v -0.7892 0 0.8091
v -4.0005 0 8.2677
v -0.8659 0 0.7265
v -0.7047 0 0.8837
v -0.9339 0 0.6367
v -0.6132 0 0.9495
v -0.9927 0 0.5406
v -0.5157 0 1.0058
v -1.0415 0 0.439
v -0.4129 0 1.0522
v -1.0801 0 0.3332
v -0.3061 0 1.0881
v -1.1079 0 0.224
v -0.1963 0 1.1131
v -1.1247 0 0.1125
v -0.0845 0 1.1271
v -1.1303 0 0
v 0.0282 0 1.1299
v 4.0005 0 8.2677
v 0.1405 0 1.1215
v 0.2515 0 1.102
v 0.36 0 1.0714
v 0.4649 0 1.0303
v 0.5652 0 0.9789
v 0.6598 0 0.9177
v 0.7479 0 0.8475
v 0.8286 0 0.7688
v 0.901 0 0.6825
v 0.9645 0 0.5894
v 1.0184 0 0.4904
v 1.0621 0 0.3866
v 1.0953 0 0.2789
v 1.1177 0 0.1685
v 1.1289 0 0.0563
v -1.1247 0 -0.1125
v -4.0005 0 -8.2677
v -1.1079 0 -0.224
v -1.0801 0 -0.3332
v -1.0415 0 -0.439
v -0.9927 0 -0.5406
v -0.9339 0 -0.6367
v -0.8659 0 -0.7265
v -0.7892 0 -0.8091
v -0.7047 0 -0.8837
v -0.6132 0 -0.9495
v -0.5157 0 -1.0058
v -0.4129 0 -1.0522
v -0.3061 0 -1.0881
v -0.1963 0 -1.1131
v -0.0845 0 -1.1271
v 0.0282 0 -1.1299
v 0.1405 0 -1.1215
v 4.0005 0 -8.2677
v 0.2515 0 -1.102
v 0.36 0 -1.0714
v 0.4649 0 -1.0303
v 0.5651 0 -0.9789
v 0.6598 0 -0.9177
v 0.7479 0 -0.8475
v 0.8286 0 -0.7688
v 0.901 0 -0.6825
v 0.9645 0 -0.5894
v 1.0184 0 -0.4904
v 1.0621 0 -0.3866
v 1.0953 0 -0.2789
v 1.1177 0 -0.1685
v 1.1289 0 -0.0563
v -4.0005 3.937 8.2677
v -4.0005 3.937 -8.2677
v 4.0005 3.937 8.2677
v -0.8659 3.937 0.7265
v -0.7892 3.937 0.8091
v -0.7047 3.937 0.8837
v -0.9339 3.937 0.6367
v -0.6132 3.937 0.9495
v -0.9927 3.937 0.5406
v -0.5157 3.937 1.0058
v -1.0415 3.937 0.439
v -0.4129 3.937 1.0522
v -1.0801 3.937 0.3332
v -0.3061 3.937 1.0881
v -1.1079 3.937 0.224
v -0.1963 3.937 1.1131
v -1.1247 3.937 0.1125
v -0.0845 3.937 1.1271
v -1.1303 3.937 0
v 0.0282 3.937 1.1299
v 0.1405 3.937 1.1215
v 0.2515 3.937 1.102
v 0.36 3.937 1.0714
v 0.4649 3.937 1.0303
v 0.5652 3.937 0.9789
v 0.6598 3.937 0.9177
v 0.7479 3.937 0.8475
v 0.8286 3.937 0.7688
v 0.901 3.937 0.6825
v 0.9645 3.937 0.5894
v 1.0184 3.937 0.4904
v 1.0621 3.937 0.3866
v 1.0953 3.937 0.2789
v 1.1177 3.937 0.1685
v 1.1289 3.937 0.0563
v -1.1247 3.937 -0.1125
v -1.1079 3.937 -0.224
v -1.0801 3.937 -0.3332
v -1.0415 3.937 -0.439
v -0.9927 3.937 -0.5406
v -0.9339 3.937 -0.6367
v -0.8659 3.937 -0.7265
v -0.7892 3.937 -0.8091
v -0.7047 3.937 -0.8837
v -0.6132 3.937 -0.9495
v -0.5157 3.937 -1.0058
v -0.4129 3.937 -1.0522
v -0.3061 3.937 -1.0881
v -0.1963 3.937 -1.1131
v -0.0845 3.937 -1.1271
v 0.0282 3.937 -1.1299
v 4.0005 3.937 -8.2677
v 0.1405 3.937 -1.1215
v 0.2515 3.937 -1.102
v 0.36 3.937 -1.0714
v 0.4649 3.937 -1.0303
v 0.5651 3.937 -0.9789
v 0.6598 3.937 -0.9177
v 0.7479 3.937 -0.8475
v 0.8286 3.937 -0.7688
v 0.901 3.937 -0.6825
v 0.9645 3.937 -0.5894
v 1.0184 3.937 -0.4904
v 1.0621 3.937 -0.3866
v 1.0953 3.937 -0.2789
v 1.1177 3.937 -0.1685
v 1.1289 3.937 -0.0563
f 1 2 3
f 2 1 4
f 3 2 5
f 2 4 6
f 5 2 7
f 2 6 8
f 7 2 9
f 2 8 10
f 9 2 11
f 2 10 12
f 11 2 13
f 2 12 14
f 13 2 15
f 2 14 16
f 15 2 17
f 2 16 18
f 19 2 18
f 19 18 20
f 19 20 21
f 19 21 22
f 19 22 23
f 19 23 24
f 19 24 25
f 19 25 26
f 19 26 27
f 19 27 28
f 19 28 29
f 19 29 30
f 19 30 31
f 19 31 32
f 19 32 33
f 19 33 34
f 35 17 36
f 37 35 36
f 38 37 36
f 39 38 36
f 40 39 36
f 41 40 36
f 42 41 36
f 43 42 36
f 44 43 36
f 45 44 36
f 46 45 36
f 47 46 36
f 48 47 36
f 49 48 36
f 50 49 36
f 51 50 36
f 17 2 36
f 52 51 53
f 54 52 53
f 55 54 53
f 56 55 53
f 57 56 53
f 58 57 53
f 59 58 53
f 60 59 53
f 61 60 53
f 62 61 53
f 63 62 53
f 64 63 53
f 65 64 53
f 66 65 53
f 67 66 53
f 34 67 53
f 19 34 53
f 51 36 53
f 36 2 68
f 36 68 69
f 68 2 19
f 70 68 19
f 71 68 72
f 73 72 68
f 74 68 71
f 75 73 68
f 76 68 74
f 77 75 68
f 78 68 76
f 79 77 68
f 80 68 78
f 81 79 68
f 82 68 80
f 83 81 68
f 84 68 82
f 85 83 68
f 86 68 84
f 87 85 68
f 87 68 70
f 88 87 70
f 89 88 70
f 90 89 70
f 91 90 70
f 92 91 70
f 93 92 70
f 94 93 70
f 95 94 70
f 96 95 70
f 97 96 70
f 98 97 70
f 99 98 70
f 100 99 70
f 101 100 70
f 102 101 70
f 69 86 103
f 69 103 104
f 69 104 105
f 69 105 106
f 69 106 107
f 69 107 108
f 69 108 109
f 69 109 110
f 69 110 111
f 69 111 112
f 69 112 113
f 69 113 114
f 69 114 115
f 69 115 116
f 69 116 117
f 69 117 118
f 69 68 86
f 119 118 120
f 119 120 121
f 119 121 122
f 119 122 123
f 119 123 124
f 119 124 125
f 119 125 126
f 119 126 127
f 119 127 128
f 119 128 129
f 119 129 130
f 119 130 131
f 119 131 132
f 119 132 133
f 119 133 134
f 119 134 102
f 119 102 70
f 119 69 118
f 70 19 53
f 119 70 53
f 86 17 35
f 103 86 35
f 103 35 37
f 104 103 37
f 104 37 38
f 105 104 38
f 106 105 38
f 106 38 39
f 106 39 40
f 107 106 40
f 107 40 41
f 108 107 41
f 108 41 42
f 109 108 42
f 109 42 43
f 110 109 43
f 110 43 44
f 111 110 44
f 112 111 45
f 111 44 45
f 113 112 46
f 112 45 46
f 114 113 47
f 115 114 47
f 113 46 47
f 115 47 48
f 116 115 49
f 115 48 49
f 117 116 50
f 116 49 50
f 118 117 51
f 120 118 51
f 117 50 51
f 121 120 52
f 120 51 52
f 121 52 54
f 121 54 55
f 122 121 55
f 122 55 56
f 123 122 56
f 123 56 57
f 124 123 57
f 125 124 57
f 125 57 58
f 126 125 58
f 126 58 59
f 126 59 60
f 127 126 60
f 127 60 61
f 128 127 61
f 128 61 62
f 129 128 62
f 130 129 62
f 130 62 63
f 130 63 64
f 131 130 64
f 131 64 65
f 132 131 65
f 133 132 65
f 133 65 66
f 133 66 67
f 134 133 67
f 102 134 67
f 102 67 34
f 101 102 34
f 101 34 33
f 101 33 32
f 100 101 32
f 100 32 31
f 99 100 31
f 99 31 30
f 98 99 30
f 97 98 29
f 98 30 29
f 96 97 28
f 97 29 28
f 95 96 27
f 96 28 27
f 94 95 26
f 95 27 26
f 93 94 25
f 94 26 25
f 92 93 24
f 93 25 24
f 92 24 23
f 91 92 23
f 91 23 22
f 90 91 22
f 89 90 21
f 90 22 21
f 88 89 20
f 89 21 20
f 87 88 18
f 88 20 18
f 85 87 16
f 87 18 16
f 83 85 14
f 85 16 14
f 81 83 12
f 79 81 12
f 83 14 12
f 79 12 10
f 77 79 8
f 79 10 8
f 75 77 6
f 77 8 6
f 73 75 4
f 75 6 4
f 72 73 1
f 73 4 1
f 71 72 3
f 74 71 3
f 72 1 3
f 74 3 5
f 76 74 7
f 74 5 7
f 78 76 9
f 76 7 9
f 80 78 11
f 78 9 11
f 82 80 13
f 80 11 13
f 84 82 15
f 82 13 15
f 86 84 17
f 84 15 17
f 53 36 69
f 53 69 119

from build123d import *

# Parameters (mm, degrees)
SKETCH1_W             = 8.001
SKETCH1_H             = 16.5354
BOSS_EXTRUDE1_DEPTH   = 3.937
F_4_40_TAPPED_HOLE1_D = 2.2606


with BuildPart() as part:
    # Sketch1 → Boss-Extrude1 (new body)
    with BuildSketch(Plane(origin=(0, 0, 0), x_dir=(1, 0, 0), z_dir=(0, 1, 0))):
        Rectangle(SKETCH1_W, SKETCH1_H)
    extrude(amount=BOSS_EXTRUDE1_DEPTH)

    # #4-40 Tapped Hole1 (through all)
    with Locations(Plane(origin=(0, 3.937, 0), x_dir=(1, 0, 0), z_dir=(0, 1, 0))):
        with Locations((0, 0)):
            Hole(F_4_40_TAPPED_HOLE1_D / 2)


solid = part.part
